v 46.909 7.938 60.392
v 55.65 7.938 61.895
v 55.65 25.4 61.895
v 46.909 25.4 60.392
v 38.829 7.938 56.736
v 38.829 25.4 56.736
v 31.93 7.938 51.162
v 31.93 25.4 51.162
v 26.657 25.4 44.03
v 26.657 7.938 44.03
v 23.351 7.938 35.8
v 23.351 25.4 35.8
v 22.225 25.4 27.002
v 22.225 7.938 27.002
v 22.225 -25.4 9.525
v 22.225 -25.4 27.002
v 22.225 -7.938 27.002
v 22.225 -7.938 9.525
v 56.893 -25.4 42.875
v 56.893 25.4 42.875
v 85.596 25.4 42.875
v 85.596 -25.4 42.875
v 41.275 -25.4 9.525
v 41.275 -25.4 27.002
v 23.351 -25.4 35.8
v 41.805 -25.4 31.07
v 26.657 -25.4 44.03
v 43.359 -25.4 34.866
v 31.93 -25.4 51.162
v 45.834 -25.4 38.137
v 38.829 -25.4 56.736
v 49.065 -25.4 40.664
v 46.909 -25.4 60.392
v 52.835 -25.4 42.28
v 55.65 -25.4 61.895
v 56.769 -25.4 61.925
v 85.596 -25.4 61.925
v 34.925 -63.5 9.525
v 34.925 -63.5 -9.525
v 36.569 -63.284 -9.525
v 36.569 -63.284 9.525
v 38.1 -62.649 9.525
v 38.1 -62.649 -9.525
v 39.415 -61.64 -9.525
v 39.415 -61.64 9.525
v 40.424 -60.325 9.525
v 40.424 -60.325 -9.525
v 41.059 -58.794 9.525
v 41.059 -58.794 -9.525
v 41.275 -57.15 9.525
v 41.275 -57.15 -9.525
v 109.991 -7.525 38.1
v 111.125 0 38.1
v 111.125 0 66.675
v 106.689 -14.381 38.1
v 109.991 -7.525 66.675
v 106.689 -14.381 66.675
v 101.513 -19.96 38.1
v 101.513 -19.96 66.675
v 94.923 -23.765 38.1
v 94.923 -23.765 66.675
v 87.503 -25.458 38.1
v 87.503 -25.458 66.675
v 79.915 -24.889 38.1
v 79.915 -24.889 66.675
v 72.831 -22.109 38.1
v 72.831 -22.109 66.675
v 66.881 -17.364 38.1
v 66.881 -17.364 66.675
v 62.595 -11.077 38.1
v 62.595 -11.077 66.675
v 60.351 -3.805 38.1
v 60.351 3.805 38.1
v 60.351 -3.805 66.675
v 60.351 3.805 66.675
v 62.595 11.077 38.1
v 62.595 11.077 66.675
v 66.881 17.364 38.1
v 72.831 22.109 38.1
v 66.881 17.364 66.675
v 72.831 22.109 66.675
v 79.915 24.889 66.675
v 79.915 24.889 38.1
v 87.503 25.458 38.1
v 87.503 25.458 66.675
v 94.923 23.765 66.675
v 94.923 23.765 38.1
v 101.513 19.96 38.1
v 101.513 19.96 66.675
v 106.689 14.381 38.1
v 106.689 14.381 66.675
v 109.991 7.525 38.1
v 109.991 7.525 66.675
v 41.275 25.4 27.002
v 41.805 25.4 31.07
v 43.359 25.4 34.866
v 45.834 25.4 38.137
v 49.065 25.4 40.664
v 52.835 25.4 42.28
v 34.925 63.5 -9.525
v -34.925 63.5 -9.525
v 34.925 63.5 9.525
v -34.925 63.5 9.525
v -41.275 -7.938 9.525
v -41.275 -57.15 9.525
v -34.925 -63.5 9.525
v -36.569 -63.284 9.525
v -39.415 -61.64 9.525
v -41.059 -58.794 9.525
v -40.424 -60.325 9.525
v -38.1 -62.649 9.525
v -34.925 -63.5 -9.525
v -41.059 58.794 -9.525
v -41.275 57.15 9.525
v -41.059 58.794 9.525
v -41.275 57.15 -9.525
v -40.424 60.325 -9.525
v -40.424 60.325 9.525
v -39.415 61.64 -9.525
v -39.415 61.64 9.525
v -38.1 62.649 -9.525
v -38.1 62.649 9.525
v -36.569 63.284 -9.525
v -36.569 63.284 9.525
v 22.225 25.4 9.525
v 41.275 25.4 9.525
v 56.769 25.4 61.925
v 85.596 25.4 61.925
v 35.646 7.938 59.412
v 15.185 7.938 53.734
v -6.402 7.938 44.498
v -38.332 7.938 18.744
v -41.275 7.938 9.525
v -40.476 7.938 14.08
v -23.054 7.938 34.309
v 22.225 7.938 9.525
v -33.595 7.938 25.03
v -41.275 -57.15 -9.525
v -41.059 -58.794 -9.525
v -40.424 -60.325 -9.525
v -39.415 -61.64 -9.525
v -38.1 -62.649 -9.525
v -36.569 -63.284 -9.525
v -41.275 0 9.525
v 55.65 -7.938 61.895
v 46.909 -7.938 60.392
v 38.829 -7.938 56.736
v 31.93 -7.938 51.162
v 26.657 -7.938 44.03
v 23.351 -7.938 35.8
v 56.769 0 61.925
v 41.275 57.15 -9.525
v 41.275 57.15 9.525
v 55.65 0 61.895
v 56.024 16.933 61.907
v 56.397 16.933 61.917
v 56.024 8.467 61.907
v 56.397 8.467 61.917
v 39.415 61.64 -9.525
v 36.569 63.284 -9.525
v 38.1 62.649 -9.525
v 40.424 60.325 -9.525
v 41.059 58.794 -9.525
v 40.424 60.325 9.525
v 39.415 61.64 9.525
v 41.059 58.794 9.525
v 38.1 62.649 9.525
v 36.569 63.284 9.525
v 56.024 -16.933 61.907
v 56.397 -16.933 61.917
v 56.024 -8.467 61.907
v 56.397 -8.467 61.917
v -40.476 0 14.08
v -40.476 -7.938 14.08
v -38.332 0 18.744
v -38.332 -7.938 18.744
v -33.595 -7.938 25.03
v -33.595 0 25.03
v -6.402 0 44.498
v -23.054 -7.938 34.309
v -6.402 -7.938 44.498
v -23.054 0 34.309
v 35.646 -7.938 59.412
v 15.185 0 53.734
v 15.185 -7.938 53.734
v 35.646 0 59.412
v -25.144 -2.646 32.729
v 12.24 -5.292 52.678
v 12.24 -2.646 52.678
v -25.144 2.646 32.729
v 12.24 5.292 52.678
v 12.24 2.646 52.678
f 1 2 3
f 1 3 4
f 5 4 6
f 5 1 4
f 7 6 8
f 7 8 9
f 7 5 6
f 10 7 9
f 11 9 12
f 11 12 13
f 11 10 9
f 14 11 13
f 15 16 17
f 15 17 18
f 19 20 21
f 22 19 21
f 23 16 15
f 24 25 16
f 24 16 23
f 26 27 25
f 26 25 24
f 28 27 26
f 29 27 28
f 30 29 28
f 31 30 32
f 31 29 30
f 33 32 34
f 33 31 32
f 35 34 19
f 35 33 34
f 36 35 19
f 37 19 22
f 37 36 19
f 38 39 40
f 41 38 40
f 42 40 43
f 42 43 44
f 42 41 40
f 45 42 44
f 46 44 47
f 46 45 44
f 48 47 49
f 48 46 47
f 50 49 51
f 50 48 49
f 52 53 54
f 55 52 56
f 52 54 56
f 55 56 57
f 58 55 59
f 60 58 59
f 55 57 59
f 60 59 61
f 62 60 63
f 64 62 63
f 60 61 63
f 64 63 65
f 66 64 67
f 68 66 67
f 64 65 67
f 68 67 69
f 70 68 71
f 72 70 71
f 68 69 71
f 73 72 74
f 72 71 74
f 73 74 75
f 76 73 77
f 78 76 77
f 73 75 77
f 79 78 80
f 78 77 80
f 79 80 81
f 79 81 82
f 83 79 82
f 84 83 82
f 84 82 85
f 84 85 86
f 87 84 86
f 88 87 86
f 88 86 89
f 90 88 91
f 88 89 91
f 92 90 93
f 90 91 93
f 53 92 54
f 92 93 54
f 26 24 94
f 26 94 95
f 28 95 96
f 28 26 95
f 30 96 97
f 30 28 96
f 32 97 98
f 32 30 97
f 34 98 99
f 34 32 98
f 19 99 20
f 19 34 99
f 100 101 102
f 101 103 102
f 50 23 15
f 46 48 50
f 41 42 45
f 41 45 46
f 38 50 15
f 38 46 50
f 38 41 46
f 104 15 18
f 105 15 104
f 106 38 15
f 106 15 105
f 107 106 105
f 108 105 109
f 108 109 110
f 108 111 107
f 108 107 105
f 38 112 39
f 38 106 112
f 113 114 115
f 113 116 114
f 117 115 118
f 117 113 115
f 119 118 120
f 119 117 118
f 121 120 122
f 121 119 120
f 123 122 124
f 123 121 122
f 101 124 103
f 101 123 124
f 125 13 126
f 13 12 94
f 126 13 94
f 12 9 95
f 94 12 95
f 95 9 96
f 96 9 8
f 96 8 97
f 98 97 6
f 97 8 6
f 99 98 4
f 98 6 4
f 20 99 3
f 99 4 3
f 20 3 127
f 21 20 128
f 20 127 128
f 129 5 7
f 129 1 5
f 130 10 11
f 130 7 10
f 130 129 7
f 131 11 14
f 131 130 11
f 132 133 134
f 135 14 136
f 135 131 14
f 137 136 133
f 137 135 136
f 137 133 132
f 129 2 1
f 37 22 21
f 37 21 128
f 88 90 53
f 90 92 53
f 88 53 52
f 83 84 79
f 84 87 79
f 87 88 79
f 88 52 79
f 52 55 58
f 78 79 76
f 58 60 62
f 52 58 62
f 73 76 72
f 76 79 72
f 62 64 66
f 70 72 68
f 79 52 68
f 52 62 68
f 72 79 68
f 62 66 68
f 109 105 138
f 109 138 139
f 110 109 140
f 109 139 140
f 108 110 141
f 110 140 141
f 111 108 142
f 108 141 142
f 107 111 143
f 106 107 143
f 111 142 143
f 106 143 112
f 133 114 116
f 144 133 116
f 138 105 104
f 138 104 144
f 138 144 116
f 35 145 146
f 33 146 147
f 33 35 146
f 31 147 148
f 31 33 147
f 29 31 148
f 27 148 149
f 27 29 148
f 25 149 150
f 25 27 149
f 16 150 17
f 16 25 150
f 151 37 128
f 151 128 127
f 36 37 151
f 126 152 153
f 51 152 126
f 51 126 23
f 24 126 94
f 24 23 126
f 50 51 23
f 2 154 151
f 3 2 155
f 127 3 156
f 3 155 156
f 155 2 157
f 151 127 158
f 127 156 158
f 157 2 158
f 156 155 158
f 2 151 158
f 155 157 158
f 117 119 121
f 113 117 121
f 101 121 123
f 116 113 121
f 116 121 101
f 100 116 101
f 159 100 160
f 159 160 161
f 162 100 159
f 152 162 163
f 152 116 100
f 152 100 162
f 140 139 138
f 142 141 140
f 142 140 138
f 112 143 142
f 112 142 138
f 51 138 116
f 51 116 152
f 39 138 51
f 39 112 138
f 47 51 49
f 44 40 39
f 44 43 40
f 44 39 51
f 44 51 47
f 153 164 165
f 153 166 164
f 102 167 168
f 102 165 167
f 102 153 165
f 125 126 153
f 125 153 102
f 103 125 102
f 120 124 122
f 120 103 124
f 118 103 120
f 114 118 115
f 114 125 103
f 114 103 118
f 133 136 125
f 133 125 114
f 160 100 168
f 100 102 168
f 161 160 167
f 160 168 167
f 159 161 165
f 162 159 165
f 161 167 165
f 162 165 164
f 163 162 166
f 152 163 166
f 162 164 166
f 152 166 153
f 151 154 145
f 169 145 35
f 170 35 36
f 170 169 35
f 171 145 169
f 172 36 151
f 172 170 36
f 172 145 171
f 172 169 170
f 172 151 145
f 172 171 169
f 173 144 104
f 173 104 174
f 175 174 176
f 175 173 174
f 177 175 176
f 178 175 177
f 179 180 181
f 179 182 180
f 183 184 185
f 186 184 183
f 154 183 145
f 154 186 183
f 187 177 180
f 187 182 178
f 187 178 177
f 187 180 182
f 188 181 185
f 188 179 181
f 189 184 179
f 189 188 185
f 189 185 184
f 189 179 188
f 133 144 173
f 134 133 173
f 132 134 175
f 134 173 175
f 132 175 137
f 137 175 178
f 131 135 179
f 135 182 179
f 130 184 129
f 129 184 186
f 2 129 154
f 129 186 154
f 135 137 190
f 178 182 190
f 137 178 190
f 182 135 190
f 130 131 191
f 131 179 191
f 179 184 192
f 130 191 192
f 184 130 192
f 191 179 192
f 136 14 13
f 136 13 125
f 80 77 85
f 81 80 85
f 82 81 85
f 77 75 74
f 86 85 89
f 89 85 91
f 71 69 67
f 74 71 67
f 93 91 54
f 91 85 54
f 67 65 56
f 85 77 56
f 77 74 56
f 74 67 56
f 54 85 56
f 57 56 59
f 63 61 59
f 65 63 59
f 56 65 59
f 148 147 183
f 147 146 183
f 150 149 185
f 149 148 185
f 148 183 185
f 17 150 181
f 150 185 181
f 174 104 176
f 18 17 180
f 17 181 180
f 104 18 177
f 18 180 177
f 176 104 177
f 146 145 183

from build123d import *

# Parameters (mm, degrees)
F1_DEPTH = 63.5
F0_W     = 25.2706611185
F0_H     = 19.05
F2_DEPTH = 25.4
F3_DEPTH = 7.9375
F5_R     = 6.35


with BuildPart() as f1:
    # F0 (on Front) → F1 (new body, symmetric)
    with BuildSketch(Plane.XZ):
        Polygon((-41.275, -9.525), (41.275, -9.525), (41.275, 9.525), (22.225, 9.525), (-41.275, 9.525), align=None)
    extrude(amount=F1_DEPTH, both=True)

    # F0 (on Front) → F2 (join, symmetric)
    with BuildSketch(Plane.XZ):
        with BuildLine():
            Line((22.225, 9.525), (41.275, 9.525))
            Line((41.275, 9.525), (41.275, 27.0022737393))
            ThreePointArc((41.275, 27.0022737393), (45.834326253, 38.1365071055), (56.8934129325, 42.8752))
            Line((56.8934129325, 42.8752), (60.325, 42.8752))
            Line((60.325, 42.8752), (60.325, 61.9252))
            Line((60.325, 61.9252), (56.769413096, 61.9252))
            add(Edge.make_bspline(
                [(55.6501414791, 61.89505307), (56.0243794143, 61.9073479869), (56.3974868874, 61.9174052801), (56.769413096, 61.9252)],
                knots=[110.1715790032, 110.1715790032, 110.1715790032, 110.1715790032, 111.1687361599, 111.1687361599, 111.1687361599, 111.1687361599], degree=3))
            ThreePointArc((55.6501414791, 61.89505307), (31.9295897749, 51.1618791392), (22.225, 27.0022737393))
            Line((22.225, 27.0022737393), (22.225, 9.525))
        make_face()
        with Locations((72.9603305593, 52.4002)):
            Rectangle(F0_W, F0_H)
    extrude(amount=F2_DEPTH, both=True)

    # F0 (on Front) → F3 (join, symmetric)
    with BuildSketch(Plane.XZ):
        with BuildLine():
            add(Edge.make_bspline(
                [(-41.275, 9.525), (-40.8453637442, 31.8633683332), (14.3022115528, 60.5366409033), (55.6501414791, 61.89505307)],
                knots=[0, 0, 0, 0, 110.1715790032, 110.1715790032, 110.1715790032, 110.1715790032], degree=3))
            Line((-41.275, 9.525), (22.225, 9.525))
            Line((22.225, 9.525), (22.225, 27.0022737393))
            ThreePointArc((22.225, 27.0022737393), (31.9295897749, 51.1618791392), (55.6501414791, 61.89505307))
        make_face()
    extrude(amount=F3_DEPTH, both=True)

    # F5
    f5_edges = [f1.edges().sort_by_distance(p)[0] for p in [
        (41.275, -63.5, 0),
        (-41.275, -63.5, 0),
        (41.275, 63.5, 0),
        (-41.275, 63.5, 0),
    ]]
    fillet(f5_edges, radius=F5_R)


with BuildPart() as f4:
    # F0 (on Front) → F4 (revolve)
    with BuildSketch(Plane.XZ):
        Polygon((85.5956611185, 61.9252), (85.5956611185, 42.8752), (85.5956611185, 38.1), (111.125, 38.1), (111.125, 66.675), (85.5956611185, 66.675), align=None)
    revolve(axis=Axis((85.5956611185, 0, 52.3875), (0, 0, -1)))


solid = Compound([f1.part, f4.part])
